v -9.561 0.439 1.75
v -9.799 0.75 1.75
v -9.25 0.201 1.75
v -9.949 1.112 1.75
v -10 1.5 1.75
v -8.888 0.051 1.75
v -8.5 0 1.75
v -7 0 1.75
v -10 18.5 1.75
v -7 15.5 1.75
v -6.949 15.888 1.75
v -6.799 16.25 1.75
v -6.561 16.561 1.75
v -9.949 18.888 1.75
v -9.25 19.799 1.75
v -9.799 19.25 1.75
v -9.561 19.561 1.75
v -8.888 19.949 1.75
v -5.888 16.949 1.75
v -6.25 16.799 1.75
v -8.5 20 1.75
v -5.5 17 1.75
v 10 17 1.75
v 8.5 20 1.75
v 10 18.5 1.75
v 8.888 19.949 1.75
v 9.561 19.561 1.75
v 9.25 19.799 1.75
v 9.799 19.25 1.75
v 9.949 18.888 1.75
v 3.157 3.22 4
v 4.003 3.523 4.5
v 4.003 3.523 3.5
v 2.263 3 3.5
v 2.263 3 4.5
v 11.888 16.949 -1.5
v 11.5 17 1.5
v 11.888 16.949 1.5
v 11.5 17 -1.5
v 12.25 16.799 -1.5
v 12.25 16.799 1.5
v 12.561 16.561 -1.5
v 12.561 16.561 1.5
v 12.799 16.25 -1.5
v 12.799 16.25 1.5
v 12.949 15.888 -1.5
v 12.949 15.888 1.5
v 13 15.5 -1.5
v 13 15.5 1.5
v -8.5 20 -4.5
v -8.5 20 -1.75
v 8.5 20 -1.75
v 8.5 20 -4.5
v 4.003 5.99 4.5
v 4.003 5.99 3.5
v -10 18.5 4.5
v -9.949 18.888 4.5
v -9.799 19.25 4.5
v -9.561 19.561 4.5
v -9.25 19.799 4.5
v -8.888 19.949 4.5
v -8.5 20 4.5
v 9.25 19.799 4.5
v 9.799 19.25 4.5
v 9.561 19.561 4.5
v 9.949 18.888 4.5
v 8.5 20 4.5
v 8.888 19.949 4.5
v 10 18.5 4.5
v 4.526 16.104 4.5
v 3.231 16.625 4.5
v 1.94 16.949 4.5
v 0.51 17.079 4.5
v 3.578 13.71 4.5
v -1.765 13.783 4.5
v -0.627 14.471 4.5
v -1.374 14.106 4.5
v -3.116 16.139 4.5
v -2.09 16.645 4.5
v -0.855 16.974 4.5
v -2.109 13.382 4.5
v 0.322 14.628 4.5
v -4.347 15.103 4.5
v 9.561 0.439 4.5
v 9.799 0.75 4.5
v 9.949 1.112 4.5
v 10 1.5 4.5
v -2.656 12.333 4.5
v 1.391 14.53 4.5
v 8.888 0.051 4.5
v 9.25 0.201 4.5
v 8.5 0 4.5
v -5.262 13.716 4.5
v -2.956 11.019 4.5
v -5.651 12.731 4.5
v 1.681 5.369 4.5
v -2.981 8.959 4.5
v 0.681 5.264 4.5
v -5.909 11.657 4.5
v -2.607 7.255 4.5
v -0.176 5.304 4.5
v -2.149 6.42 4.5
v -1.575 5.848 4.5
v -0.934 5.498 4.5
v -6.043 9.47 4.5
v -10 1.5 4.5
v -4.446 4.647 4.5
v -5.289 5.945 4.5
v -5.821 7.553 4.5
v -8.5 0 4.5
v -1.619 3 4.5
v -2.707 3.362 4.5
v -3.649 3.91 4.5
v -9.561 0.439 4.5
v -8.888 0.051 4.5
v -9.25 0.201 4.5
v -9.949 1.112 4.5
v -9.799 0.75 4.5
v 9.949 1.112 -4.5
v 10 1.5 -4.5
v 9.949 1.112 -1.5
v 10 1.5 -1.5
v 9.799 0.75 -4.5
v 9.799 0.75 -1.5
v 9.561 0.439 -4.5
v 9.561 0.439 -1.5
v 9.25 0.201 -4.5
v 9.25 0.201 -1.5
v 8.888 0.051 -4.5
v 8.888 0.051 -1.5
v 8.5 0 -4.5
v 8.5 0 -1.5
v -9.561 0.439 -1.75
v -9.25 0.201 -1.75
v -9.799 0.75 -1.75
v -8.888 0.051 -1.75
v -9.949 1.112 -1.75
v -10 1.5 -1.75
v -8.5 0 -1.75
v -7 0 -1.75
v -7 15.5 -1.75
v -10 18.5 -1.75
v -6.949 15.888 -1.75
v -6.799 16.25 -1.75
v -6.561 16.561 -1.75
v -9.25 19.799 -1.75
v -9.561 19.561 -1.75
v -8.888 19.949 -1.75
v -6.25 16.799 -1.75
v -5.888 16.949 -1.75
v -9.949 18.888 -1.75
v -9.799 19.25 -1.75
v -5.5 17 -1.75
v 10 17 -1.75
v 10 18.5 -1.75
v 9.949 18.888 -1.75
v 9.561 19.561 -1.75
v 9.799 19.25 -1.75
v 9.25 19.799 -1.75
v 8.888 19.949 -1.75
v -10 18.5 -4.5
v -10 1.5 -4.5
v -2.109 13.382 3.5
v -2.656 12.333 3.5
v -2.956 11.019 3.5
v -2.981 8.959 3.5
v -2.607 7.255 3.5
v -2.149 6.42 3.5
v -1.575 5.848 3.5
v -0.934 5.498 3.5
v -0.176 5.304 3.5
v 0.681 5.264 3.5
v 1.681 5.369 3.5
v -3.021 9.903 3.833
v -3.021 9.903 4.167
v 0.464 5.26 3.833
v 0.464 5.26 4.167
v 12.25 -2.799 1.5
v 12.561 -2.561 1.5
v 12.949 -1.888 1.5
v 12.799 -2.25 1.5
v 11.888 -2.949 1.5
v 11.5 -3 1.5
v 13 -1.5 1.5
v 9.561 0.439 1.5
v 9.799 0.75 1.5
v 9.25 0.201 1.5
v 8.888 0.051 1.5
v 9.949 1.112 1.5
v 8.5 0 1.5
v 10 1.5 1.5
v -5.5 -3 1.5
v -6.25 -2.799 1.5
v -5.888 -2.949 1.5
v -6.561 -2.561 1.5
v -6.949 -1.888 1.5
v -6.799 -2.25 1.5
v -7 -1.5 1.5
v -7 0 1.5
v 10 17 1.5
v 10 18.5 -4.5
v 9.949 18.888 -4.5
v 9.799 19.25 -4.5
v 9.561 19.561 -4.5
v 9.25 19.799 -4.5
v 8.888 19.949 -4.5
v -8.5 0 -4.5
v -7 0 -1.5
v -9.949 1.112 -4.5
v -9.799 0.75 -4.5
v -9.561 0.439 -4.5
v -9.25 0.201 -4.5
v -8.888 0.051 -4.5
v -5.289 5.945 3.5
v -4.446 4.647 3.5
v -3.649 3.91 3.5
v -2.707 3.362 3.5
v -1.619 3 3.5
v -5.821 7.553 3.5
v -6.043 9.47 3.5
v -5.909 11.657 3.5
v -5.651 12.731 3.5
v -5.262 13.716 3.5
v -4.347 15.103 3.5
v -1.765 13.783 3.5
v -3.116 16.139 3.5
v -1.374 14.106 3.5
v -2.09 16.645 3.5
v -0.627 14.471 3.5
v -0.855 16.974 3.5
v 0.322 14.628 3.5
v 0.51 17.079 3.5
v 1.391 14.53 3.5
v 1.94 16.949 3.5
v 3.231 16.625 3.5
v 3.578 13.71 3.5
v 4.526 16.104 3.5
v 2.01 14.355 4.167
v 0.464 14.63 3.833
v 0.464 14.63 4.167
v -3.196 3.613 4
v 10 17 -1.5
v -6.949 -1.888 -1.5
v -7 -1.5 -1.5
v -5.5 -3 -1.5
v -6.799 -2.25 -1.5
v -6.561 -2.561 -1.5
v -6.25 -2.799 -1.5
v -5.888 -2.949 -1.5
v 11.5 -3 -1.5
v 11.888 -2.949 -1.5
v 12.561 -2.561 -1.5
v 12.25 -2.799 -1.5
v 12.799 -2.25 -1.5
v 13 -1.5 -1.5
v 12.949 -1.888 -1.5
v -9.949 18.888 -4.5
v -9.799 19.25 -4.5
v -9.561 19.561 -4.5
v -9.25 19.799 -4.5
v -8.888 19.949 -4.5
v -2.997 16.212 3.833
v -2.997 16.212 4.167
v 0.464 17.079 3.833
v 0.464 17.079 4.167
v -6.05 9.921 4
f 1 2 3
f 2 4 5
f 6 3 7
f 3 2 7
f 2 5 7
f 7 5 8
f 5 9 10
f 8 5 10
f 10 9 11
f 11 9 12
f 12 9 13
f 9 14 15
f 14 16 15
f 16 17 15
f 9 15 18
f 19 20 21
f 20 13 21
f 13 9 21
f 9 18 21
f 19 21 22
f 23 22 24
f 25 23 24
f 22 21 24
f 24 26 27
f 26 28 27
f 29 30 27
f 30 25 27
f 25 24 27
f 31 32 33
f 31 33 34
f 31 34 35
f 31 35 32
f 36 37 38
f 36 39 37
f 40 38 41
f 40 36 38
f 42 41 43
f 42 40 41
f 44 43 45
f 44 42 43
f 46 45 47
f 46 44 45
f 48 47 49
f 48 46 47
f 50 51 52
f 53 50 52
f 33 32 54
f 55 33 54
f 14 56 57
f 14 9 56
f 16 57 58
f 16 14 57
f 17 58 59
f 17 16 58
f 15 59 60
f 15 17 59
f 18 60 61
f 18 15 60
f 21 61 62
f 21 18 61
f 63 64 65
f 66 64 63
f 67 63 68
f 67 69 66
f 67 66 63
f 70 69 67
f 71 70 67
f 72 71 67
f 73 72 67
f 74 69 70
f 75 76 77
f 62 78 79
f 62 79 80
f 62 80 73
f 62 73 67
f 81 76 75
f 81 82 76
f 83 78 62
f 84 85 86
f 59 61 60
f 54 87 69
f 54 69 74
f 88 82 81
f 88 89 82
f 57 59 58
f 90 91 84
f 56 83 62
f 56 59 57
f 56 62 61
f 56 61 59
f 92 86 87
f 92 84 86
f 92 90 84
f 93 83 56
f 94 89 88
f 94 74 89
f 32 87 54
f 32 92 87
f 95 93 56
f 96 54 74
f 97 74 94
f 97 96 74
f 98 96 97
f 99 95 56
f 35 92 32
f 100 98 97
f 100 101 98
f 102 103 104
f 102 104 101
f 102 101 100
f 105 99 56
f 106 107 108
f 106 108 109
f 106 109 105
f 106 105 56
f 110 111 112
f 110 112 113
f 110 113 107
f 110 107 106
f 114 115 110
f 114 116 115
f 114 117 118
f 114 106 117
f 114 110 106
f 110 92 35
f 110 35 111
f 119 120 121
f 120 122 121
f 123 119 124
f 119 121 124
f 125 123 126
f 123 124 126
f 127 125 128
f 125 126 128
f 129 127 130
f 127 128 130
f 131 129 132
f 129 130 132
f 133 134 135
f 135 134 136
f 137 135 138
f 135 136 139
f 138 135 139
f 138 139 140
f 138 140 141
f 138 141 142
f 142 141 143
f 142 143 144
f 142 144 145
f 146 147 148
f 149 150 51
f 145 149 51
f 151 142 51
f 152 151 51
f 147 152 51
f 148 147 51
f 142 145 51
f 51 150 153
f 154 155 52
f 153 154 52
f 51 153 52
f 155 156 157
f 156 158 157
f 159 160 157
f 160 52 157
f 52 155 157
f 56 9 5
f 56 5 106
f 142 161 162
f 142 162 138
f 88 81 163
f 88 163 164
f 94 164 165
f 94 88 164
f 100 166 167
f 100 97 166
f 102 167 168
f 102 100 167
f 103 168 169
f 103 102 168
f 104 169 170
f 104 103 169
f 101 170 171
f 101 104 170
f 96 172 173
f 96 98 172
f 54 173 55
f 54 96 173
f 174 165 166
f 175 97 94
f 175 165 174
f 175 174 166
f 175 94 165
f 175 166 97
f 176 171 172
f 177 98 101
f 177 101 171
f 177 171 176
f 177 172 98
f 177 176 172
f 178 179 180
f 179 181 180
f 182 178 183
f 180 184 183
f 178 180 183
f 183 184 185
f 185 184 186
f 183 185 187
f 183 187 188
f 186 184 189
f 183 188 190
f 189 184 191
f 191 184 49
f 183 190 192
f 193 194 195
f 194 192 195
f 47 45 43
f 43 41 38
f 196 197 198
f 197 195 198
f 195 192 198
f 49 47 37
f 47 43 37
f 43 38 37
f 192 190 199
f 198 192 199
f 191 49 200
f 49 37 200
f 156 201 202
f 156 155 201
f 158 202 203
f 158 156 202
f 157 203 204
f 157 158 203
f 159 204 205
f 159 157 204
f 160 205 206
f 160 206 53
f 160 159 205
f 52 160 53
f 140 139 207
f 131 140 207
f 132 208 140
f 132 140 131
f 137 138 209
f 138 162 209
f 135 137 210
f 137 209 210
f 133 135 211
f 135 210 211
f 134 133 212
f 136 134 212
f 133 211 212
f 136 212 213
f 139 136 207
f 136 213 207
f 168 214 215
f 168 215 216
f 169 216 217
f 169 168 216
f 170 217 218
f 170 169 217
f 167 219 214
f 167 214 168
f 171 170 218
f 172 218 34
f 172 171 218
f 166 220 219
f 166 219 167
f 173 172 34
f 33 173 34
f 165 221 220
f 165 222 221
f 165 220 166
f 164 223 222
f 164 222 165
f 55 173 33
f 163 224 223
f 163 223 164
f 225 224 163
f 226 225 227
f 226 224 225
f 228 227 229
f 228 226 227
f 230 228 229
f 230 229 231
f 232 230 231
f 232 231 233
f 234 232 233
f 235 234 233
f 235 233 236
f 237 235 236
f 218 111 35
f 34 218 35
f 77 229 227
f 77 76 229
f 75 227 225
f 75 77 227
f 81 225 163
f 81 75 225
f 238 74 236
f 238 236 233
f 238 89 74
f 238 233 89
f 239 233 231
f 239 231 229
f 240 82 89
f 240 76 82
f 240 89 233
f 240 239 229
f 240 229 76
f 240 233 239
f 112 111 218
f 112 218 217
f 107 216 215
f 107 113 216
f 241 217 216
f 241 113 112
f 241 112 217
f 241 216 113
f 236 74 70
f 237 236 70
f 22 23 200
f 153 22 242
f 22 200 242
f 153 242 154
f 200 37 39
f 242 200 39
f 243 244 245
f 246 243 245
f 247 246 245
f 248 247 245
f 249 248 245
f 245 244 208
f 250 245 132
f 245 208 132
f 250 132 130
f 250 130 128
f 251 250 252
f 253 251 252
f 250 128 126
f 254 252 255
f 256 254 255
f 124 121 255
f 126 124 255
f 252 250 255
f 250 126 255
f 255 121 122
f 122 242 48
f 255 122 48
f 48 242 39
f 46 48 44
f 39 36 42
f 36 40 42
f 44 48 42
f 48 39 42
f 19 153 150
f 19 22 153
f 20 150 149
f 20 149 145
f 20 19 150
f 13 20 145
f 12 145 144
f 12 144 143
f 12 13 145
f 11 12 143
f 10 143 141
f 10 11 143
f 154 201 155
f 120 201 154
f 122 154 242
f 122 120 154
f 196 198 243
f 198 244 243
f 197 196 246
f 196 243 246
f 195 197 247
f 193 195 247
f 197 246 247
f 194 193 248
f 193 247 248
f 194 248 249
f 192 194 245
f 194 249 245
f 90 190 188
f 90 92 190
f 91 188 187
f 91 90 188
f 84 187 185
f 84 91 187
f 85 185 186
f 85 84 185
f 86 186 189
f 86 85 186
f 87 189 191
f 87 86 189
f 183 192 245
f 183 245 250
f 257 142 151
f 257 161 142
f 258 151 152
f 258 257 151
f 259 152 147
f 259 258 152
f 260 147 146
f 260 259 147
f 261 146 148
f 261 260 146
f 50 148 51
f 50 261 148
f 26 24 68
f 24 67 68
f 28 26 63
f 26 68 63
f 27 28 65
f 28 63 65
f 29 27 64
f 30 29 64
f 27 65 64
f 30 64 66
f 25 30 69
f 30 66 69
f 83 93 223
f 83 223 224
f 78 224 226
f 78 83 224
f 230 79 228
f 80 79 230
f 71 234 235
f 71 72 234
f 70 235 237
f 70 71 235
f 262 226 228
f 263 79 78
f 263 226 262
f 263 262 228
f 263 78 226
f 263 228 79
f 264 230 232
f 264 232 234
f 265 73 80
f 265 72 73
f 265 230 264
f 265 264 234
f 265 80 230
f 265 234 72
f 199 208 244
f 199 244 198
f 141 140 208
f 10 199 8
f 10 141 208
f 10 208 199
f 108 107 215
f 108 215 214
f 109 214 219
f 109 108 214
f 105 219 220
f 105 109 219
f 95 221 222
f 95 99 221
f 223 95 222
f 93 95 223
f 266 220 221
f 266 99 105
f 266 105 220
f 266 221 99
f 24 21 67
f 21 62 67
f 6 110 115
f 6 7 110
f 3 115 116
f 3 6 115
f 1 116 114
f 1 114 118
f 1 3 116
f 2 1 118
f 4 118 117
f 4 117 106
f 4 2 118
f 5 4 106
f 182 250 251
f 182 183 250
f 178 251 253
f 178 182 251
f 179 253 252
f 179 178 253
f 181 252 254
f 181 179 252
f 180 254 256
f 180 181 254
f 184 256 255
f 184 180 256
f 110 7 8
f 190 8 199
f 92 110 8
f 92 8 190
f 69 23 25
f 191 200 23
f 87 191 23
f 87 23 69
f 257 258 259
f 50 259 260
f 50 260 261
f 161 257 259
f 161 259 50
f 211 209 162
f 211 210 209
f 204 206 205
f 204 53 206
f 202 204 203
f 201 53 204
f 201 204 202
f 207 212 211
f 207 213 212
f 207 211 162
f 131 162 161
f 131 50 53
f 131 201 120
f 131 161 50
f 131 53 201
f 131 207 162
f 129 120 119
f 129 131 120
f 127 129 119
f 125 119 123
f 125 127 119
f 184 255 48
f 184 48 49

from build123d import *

# Parameters (mm, degrees)
F0_W     = 14
F0_H     = 3
F0_W_2   = 3
F1_DEPTH = 20
F2_DEPTH = 3
F3_W     = 3
F3_H     = 3
F4_DEPTH = 100
F5_W     = 3
F5_H     = 3.5
F6_DEPTH = 100
F7_R     = 1.5
F9_DEPTH = 1


with BuildPart() as f1:
    # F0 (on Front) → F1 (new body)
    with BuildSketch(Plane.XZ):
        Polygon((10, 1.5), (10, 4.5), (-10, 4.5), (-10, 1.5), (-7, 1.5), (7, 1.5), align=None)
        Rectangle(F0_W, F0_H)
        with Locations((11.5, 0)):
            Rectangle(F0_W_2, F0_H)
        with Locations((8.5, 0)):
            Rectangle(F0_W_2, F0_H)
        with Locations((-8.5, 0)):
            Rectangle(F0_W_2, F0_H)
        Polygon((10, -4.5), (10, -1.5), (7, -1.5), (-7, -1.5), (-10, -1.5), (-10, -4.5), align=None)
    extrude(amount=-F1_DEPTH)

    # F0 (on Front) → F2 (join)
    with BuildSketch(Plane.XZ):
        with Locations((-8.5, 0)):
            Rectangle(F0_W_2, F0_H)
        Rectangle(F0_W, F0_H)
        with Locations((8.5, 0)):
            Rectangle(F0_W_2, F0_H)
        with Locations((11.5, 0)):
            Rectangle(F0_W_2, F0_H)
    extrude(amount=F2_DEPTH)

    # F3 (on face) → F4 (cut)
    with BuildSketch(Plane.YZ.offset(13)):
        Polygon((23, -1.75), (23, 1.75), (17, 1.75), (17, 1.5), (20, 1.5), (20, -1.5), (17, -1.5), (17, -1.75), align=None)
        with Locations((18.5, 0)):
            Rectangle(F3_W, F3_H)
    extrude(amount=-F4_DEPTH, mode=Mode.SUBTRACT)

    # F5 (on face) → F6 (cut)
    with BuildSketch(Plane(origin=(0, 17, 0), x_dir=(-1, 0, 0), z_dir=(0, 1, 0))):
        with Locations((11.5, 0)):
            Rectangle(F5_W, F5_H)
        with Locations((8.5, 0)):
            Rectangle(F5_W, F5_H)
    extrude(amount=-F6_DEPTH, mode=Mode.SUBTRACT)

    # F7
    f7_edges = [f1.edges().sort_by_distance(p)[0] for p in [
        (-7, -3, 0),
        (13, -3, 0),
        (10, 0, 3),
        (10, 0, -3),
        (-10, 0, -3.125),
        (-10, 0, 3.125),
        (-7, 17, 0),
        (-10, 20, 3.125),
        (-10, 20, -3.125),
        (13, 17, 0),
        (10, 20, 3.125),
        (10, 20, -3.125),
    ]]
    fillet(f7_edges, radius=F7_R)

    # F8 (on face) → F9 (cut)
    with BuildSketch(Plane.XY.offset(4.5)):
        with BuildLine():
            Line((-1.6191336456, 3), (2.2633536651, 3))
            add(Edge.make_bspline(
                [(4.0033986182, 3.5225694444), (3.1800065383, 3.1782684858), (2.2633536651, 3)],
                knots=[0, 0, 0, 0.4822306436, 0.4822306436, 0.4822306436], degree=2))
            Line((4.0033986182, 3.5225694444), (4.0033986182, 5.9895833333))
            add(Edge.make_bspline(
                [(0.4639020904, 5.2604166667), (1.9252736182, 5.2604166667), (4.0033986182, 5.9895833333)],
                knots=[0, 0, 0, 1, 1, 1], degree=2))
            add(Edge.make_bspline(
                [(-3.0209069374, 9.9027777778), (-3.0209069374, 5.2604166667), (0.4639020904, 5.2604166667)],
                knots=[0, 0, 0, 1, 1, 1], degree=2))
            add(Edge.make_bspline(
                [(-2.109448604, 13.3815104167), (-3.0209069374, 12.1328125), (-3.0209069374, 9.9027777778)],
                knots=[0, 0, 0, 1, 1, 1], degree=2))
            add(Edge.make_bspline(
                [(0.4639020904, 14.6302083333), (-1.1979902707, 14.6302083333), (-2.109448604, 13.3815104167)],
                knots=[0, 0, 0, 1, 1, 1], degree=2))
            add(Edge.make_bspline(
                [(2.0103430626, 14.3552517361), (1.2234507015, 14.6302083333), (0.4639020904, 14.6302083333)],
                knots=[0, 0, 0, 1, 1, 1], degree=2))
            add(Edge.make_bspline(
                [(3.578051396, 13.7096354167), (2.7972354237, 14.0802951389), (2.0103430626, 14.3552517361)],
                knots=[0, 0, 0, 1, 1, 1], degree=2))
            Line((3.578051396, 13.7096354167), (4.5259680626, 16.1037326389))
            add(Edge.make_bspline(
                [(0.4639020904, 17.0789930556), (2.484301396, 17.0789930556), (4.5259680626, 16.1037326389)],
                knots=[0, 0, 0, 1, 1, 1], degree=2))
            add(Edge.make_bspline(
                [(-2.9966013818, 16.2115885417), (-1.5200388818, 17.0789930556), (0.4639020904, 17.0789930556)],
                knots=[0, 0, 0, 1, 1, 1], degree=2))
            add(Edge.make_bspline(
                [(-5.2615753401, 13.7157118056), (-4.4731638818, 15.3441840278), (-2.9966013818, 16.2115885417)],
                knots=[0, 0, 0, 1, 1, 1], degree=2))
            add(Edge.make_bspline(
                [(-6.0499867985, 9.9210069444), (-6.0499867985, 12.0872395833), (-5.2615753401, 13.7157118056)],
                knots=[0, 0, 0, 1, 1, 1], degree=2))
            add(Edge.make_bspline(
                [(-4.4458201318, 4.6467013889), (-6.0499867985, 6.4848090278), (-6.0499867985, 9.9210069444)],
                knots=[0, 0, 0, 1, 1, 1], degree=2))
            add(Edge.make_bspline(
                [(-1.6191336456, 3), (-3.3593104462, 3.4017423741), (-4.4458201318, 4.6467013889)],
                knots=[0.3226952609, 0.3226952609, 0.3226952609, 1, 1, 1], degree=2))
        make_face()
    extrude(amount=-F9_DEPTH, mode=Mode.SUBTRACT)


solid = f1.part
